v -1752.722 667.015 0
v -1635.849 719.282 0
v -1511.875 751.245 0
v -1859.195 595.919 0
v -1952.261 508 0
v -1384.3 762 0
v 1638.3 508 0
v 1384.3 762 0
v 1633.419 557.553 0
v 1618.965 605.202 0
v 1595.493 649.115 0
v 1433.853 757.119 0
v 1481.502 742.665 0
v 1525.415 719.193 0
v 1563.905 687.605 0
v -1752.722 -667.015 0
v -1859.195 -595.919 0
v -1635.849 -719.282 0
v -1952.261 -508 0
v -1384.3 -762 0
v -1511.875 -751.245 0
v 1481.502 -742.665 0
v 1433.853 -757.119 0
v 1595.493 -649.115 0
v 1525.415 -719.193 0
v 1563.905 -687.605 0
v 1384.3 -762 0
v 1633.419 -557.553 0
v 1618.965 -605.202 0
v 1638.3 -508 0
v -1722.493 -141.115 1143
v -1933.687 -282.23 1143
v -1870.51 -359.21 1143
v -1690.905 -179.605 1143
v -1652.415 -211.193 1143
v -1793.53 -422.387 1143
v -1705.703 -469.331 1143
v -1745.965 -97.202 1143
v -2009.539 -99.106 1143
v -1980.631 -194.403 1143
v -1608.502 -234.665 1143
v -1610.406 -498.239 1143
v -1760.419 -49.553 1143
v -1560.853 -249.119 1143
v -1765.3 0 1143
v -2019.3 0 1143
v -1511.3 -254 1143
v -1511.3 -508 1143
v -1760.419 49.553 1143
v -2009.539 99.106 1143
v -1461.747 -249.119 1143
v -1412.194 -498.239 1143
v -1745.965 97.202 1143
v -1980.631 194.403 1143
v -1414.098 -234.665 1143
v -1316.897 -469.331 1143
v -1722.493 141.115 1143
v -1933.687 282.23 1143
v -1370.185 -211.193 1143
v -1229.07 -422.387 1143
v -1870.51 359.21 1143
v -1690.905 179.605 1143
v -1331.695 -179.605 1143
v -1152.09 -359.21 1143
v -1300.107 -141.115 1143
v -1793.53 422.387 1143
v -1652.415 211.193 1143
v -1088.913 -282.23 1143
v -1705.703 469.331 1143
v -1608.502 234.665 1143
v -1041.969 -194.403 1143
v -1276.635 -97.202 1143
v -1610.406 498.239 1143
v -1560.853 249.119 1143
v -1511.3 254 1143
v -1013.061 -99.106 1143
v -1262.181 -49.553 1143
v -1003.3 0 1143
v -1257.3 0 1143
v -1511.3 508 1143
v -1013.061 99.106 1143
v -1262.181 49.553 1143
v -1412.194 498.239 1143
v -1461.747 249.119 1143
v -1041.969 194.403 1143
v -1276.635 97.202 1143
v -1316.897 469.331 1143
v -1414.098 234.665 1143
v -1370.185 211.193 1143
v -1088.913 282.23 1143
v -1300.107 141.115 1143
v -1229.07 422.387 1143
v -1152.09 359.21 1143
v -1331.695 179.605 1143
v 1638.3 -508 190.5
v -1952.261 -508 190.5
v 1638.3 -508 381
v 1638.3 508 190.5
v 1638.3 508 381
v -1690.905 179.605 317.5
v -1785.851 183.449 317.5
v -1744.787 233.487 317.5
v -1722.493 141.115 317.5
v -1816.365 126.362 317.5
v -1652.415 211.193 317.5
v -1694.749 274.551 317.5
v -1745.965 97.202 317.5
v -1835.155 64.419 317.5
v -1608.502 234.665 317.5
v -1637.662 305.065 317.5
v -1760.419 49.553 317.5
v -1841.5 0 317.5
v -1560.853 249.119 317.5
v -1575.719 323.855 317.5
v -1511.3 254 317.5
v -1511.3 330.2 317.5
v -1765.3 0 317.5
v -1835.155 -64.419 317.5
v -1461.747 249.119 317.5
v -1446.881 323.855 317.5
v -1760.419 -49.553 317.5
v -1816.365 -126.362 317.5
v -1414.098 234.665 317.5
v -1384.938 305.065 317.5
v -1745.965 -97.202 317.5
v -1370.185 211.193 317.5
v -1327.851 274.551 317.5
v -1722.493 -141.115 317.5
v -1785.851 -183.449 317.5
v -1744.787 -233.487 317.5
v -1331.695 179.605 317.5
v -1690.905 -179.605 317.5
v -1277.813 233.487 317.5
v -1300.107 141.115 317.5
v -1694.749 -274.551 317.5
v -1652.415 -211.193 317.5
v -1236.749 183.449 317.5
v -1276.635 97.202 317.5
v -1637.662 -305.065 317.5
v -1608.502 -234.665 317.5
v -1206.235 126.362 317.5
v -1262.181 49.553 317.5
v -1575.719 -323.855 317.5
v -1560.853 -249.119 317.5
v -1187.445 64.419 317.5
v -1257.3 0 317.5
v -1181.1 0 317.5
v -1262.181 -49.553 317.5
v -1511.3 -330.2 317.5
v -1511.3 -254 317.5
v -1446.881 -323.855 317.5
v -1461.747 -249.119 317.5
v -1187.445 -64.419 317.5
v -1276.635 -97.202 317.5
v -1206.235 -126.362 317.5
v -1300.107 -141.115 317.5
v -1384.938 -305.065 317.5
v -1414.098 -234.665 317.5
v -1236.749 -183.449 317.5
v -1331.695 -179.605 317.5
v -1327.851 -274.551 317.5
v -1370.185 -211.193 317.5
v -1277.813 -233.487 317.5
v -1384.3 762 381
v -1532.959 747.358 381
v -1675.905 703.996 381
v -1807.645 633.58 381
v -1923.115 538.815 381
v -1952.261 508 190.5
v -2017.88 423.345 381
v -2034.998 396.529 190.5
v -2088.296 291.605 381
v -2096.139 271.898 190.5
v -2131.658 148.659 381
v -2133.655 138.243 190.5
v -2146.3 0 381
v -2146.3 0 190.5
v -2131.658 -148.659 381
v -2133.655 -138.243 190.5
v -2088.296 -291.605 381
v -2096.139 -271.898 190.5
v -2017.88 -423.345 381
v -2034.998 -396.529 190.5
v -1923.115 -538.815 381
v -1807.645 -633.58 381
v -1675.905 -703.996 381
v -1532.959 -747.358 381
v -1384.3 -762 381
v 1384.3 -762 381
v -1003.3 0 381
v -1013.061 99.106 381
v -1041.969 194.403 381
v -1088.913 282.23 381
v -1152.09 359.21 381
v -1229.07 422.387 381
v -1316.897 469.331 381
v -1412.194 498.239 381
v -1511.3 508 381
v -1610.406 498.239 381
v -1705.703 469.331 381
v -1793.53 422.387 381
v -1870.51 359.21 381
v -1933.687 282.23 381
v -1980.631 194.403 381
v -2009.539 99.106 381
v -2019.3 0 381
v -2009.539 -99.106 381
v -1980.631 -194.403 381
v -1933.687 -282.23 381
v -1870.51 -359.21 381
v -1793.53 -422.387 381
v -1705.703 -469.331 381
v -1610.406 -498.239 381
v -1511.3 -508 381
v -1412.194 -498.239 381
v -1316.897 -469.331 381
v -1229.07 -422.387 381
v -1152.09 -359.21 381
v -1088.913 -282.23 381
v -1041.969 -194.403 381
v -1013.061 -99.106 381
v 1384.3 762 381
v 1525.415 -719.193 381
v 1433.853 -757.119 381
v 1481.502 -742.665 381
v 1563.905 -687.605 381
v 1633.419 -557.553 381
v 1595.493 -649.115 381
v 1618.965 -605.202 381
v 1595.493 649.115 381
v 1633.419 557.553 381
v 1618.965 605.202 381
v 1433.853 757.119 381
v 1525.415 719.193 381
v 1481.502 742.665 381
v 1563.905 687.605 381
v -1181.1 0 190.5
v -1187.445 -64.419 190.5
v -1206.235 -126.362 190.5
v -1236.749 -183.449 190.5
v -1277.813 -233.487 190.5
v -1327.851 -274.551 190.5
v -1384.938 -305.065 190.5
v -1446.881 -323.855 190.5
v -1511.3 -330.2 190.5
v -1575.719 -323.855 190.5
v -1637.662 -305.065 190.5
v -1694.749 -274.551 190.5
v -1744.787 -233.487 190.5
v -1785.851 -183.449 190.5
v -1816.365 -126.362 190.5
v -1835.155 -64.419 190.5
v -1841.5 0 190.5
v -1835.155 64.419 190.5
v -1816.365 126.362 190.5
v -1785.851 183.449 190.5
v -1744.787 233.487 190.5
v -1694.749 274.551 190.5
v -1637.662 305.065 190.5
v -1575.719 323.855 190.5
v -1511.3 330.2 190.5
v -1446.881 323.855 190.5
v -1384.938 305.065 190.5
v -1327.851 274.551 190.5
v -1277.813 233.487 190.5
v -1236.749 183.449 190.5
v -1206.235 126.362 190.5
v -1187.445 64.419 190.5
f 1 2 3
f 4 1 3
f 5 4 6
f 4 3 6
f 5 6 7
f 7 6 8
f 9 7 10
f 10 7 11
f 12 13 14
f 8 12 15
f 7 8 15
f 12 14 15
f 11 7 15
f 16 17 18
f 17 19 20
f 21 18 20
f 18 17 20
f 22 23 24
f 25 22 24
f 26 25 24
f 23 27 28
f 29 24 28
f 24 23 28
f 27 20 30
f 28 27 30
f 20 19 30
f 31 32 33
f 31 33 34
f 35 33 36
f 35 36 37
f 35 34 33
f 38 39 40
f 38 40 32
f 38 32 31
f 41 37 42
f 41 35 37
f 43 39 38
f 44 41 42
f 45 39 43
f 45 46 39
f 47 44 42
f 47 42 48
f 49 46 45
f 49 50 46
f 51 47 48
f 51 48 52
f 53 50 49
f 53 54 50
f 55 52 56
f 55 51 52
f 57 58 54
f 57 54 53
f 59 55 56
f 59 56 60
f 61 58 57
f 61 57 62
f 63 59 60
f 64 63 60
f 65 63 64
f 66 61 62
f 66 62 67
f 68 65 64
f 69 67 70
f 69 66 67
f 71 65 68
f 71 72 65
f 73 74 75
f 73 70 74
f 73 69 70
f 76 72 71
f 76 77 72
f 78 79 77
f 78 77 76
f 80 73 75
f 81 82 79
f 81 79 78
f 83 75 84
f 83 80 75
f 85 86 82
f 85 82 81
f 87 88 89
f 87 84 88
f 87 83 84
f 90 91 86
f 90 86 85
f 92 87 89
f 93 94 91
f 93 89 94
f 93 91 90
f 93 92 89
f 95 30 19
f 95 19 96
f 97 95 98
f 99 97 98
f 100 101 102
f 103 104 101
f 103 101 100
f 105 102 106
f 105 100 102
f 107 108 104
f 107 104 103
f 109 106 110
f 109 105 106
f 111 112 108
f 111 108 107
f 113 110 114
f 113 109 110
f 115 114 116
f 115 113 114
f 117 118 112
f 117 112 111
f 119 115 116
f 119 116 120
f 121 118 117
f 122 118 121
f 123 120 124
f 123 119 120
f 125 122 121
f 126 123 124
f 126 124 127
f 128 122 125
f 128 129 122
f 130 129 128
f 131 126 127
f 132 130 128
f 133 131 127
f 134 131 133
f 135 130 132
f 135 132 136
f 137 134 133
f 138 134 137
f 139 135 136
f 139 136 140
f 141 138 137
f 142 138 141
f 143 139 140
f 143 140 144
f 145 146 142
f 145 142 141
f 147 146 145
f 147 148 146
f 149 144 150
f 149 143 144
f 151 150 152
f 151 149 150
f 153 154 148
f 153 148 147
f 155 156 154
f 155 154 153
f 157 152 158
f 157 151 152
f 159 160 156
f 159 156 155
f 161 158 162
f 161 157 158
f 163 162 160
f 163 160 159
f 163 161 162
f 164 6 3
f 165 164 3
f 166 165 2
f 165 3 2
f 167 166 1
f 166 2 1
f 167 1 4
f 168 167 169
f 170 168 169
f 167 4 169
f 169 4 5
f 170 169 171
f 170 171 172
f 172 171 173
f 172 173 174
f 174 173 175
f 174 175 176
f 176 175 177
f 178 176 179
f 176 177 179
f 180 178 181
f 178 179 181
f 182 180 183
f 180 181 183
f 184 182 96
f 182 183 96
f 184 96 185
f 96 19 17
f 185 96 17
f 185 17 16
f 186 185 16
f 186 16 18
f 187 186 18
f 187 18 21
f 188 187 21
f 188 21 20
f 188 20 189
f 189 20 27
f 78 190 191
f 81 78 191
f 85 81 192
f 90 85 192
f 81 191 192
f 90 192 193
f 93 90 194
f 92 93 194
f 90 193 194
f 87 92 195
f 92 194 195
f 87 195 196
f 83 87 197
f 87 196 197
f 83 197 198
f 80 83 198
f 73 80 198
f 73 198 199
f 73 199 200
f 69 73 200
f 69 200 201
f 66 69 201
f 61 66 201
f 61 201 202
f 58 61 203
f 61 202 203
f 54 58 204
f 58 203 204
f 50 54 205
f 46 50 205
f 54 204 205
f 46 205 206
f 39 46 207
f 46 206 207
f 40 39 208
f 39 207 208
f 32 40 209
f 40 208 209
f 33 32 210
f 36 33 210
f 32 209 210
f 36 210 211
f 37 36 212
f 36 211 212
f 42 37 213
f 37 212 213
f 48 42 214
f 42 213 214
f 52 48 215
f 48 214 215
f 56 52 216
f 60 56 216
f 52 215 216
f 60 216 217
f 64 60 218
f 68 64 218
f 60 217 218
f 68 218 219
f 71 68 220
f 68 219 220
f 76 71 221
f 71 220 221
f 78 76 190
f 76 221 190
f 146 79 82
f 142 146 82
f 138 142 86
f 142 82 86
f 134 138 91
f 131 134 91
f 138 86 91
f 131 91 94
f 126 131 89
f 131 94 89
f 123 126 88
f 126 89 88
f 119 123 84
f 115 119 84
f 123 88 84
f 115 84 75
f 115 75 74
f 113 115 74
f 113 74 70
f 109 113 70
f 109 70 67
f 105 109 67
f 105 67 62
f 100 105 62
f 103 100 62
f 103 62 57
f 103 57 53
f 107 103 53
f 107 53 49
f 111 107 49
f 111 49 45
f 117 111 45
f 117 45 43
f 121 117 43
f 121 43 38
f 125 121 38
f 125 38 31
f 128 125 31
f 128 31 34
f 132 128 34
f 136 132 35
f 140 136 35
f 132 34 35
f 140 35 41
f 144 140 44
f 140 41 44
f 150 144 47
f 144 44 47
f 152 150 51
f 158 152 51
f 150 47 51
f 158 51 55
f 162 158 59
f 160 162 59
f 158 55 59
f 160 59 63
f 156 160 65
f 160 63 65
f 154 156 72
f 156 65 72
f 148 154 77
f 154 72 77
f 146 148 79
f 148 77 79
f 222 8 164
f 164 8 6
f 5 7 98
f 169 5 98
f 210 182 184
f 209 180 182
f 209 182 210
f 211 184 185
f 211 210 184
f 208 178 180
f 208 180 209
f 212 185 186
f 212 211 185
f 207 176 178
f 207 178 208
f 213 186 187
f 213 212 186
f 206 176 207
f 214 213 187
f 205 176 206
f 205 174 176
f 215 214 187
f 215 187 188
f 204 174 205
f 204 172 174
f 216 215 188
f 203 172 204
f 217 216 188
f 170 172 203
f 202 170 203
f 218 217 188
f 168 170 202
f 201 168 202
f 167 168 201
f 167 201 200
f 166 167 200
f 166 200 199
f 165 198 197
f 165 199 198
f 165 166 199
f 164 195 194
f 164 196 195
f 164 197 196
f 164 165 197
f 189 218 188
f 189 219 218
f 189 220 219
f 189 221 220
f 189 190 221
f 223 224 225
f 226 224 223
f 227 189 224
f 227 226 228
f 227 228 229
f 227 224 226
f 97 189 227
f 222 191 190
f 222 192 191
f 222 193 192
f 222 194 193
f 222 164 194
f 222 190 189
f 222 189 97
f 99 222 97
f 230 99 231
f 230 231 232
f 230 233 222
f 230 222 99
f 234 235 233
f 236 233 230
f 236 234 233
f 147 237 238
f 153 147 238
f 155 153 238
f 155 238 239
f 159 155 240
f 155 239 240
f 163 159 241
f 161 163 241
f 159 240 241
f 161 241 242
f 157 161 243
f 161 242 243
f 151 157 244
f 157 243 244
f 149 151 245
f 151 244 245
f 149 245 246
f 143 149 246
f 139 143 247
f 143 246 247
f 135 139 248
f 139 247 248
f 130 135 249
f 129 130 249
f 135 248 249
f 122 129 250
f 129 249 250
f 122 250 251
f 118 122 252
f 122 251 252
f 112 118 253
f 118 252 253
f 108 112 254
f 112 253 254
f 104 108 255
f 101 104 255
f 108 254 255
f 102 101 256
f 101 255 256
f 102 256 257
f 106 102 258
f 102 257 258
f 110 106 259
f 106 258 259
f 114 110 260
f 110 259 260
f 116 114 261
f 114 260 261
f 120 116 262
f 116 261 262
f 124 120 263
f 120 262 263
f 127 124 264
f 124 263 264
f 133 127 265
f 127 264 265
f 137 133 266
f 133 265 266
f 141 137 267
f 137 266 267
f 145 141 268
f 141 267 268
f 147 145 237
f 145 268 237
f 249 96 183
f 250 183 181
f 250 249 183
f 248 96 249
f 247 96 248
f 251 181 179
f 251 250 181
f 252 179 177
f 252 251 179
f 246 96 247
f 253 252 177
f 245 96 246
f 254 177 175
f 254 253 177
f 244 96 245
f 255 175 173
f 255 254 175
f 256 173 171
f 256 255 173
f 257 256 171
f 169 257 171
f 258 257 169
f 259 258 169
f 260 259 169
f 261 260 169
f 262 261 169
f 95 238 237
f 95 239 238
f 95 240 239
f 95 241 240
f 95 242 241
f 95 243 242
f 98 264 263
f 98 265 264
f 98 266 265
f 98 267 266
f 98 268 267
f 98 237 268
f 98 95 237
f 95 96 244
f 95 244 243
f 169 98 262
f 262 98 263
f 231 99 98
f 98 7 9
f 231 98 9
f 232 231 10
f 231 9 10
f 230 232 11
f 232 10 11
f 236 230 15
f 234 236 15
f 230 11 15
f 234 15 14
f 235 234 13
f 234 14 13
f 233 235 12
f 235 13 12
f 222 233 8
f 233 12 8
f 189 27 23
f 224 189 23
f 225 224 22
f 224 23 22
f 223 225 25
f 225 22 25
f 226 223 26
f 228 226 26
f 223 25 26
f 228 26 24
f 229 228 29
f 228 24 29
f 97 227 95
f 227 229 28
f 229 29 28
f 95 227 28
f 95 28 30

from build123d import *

# Parameters (mm, degrees)
F1_DEPTH  = 381
F3_R      = 508
F4_DEPTH  = 762
F5_R      = 254
F6_DEPTH  = 1143.001
F7_W      = 1016
F7_H      = 190.5
F8_DEPTH  = 3784.601
F9_R      = 330.2
F10_DEPTH = 127


with BuildPart() as f1:
    # F0 (on Top) → F1 (new body)
    with BuildSketch(Plane.XY):
        with BuildLine():
            Line((-1384.3, -762), (1384.3, -762))
            Line((1384.3, -762), (1384.3, -501.65))
            Line((1384.3, -501.65), (1384.3, 508))
            Line((1384.3, 508), (1384.3, 762))
            Line((1384.3, 762), (-1384.3, 762))
            ThreePointArc((-1384.3, 762), (-845.4846327359, 538.8153672641), (-622.3, 0))
            ThreePointArc((-622.3, 0), (-845.4846327359, -538.8153672641), (-1384.3, -762))
        make_face()
        with BuildLine():
            Line((1384.3, -501.65), (1384.3, -762))
            ThreePointArc((1384.3, -762), (1563.9051224214, -687.6051224214), (1638.3, -508))
            Line((1638.3, -508), (1390.65, -508))
            ThreePointArc((1390.65, -508), (1386.1598719395, -506.1401280605), (1384.3, -501.65))
        make_face()
        with BuildLine():
            ThreePointArc((-1384.3, 762), (-2146.3, 0), (-1384.3, -762))
            Line((-1384.3, -762), (-1384.3, 762))
        make_face()
        with BuildLine():
            Line((-1384.3, 762), (-1384.3, -762))
            ThreePointArc((-1384.3, -762), (-845.4846327359, -538.8153672641), (-622.3, 0))
            ThreePointArc((-622.3, 0), (-845.4846327359, 538.8153672641), (-1384.3, 762))
        make_face()
        with BuildLine():
            Line((1384.3, 508), (1384.3, -501.65))
            ThreePointArc((1384.3, -501.65), (1386.1598719395, -506.1401280605), (1390.65, -508))
            Line((1390.65, -508), (1638.3, -508))
            Line((1638.3, -508), (1638.3, 508))
            Line((1638.3, 508), (1384.3, 508))
        make_face()
        with BuildLine():
            Line((1384.3, 762), (1384.3, 508))
            Line((1384.3, 508), (1638.3, 508))
            ThreePointArc((1638.3, 508), (1563.9051224214, 687.6051224214), (1384.3, 762))
        make_face()
    extrude(amount=F1_DEPTH)

    # F3 (on face) → F4 (join)
    with BuildSketch(Plane.XY.offset(381)):
        with Locations((-1511.3, 0)):
            Circle(F3_R)
    extrude(amount=F4_DEPTH)

    # F5 (on face) → F6 (cut, through all)
    with BuildSketch(Plane.XY.offset(1143)):
        with Locations((-1511.3, 0)):
            Circle(F5_R)
    extrude(amount=-F6_DEPTH, mode=Mode.SUBTRACT)

    # F7 (on face) → F8 (cut, through all)
    with BuildSketch(Plane.YZ.offset(1638.3)):
        with Locations((0, 95.25)):
            Rectangle(F7_W, F7_H)
    extrude(amount=-F8_DEPTH, mode=Mode.SUBTRACT)

    # F9 (on face) → F10 (cut)
    with BuildSketch(Plane(origin=(0, 0, 190.5), x_dir=(1, 0, 0), z_dir=(0, 0, -1))):
        with Locations((-1511.3, 0)):
            Circle(F9_R)
    extrude(amount=-F10_DEPTH, mode=Mode.SUBTRACT)


solid = f1.part
